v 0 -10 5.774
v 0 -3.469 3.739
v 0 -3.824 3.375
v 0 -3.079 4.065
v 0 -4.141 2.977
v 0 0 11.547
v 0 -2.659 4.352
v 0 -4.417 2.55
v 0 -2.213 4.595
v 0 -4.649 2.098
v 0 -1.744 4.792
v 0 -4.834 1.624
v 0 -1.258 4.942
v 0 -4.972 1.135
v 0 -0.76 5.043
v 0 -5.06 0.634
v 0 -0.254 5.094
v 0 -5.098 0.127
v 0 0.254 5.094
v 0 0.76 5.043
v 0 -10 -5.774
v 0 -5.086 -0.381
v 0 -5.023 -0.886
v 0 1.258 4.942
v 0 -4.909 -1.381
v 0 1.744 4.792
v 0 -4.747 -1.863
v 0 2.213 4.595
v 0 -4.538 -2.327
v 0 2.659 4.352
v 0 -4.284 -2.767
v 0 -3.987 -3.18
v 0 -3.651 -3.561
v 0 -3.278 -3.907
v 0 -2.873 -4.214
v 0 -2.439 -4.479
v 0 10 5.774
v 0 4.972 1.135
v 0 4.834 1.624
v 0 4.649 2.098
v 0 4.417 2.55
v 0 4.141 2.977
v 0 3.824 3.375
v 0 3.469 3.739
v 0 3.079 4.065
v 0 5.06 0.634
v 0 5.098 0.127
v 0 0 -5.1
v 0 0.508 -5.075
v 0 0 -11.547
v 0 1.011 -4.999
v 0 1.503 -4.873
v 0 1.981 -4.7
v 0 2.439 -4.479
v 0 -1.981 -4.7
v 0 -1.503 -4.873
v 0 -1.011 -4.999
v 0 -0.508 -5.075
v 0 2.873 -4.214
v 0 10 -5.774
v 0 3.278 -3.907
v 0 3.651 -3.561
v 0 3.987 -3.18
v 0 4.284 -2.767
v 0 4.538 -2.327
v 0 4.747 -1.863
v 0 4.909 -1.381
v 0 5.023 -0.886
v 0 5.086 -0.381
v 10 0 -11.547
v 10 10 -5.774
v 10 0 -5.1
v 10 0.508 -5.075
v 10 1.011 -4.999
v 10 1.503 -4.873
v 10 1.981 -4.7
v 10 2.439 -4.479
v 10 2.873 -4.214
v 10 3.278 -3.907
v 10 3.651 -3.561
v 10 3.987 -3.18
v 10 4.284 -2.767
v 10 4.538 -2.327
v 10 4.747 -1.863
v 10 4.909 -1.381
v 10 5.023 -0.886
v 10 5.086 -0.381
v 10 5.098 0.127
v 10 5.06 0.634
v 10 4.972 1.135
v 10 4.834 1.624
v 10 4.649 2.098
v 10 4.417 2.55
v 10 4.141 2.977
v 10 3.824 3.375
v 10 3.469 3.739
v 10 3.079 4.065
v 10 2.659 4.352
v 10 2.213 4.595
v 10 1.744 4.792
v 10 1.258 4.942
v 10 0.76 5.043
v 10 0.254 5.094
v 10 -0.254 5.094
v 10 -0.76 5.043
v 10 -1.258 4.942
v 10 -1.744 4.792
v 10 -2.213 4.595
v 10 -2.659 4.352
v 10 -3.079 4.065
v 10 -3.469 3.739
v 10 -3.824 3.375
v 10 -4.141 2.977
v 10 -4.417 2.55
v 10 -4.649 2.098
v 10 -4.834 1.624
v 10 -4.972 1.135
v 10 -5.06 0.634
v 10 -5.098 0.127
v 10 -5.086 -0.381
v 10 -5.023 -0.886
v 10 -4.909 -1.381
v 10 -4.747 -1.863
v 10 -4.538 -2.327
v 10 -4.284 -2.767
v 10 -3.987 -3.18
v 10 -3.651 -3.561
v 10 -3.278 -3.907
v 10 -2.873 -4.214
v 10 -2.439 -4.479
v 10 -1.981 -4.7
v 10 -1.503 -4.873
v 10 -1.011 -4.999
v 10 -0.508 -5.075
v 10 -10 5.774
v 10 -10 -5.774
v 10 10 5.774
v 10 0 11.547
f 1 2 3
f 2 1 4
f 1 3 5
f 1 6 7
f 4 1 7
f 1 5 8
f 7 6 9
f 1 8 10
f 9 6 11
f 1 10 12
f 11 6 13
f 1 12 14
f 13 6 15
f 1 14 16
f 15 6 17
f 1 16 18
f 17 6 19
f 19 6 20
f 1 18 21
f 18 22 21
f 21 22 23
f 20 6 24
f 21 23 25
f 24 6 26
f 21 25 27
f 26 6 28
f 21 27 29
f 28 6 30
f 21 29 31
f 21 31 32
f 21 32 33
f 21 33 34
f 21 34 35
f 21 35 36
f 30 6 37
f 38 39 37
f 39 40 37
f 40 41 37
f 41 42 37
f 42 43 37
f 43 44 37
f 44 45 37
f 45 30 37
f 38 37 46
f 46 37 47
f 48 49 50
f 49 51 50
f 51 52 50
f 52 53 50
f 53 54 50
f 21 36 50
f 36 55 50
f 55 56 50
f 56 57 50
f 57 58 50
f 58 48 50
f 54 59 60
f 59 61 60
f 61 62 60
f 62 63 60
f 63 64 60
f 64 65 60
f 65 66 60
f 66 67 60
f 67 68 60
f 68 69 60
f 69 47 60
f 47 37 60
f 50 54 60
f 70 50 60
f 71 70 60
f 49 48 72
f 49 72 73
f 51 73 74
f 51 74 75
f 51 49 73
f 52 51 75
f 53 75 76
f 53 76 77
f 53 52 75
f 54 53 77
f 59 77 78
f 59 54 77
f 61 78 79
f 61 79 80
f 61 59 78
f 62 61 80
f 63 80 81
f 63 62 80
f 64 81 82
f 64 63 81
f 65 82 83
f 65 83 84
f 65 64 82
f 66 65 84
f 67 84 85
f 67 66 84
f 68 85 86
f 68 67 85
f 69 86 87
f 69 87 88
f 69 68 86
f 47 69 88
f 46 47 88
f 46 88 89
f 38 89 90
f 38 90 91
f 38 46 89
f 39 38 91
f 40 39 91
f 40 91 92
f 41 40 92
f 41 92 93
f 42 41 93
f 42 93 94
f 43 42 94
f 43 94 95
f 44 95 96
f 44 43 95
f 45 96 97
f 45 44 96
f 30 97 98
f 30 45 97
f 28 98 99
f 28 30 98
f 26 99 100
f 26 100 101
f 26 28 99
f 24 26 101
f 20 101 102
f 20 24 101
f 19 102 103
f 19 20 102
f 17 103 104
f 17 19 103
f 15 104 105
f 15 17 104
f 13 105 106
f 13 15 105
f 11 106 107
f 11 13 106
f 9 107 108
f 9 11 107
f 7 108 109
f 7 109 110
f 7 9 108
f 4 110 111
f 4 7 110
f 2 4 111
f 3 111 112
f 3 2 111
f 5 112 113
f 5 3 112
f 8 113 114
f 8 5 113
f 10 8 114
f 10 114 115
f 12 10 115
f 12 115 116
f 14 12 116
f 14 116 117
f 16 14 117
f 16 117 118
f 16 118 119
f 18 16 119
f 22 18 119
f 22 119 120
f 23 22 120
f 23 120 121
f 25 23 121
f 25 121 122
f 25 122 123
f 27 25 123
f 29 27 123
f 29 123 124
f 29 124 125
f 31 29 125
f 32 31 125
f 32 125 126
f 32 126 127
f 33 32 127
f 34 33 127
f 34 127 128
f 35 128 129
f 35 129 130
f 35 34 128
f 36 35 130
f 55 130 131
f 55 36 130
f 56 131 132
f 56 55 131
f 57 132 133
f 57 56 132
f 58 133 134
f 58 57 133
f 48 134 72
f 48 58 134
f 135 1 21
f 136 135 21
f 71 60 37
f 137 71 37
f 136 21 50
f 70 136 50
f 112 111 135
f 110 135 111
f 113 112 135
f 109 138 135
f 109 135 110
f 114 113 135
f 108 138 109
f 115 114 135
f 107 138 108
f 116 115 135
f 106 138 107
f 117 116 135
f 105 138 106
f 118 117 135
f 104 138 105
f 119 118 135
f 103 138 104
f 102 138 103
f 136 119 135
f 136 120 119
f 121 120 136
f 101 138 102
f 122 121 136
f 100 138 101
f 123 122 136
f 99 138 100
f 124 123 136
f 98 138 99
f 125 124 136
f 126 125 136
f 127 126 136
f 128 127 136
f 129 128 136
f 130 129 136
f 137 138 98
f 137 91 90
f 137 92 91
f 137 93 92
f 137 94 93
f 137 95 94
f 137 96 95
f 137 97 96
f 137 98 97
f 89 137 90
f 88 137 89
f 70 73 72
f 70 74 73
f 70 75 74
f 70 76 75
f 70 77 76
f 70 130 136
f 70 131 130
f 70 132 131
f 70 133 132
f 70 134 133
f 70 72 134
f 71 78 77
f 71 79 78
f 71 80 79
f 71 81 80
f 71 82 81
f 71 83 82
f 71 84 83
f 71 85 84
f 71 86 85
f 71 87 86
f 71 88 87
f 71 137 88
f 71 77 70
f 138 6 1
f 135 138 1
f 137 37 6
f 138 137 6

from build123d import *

# Parameters (mm, degrees)
SKETCH_1_R         = 5.1
F_01_HEX_M12_DEPTH = 10


with BuildPart() as part:
    # 草图1 → 01_HEX_M12 (new body)
    with BuildSketch(Plane(origin=(0, 0, 0), x_dir=(0, 0, -1), z_dir=(1, 0, 0))):
        Polygon((11.547005384, 0), (5.773502692, 10), (-5.773502692, 10), (-11.547005384, 0), (-5.773502692, -10), (5.773502692, -10), align=None)
        Circle(SKETCH_1_R, mode=Mode.SUBTRACT)
    extrude(amount=F_01_HEX_M12_DEPTH)


solid = part.part
